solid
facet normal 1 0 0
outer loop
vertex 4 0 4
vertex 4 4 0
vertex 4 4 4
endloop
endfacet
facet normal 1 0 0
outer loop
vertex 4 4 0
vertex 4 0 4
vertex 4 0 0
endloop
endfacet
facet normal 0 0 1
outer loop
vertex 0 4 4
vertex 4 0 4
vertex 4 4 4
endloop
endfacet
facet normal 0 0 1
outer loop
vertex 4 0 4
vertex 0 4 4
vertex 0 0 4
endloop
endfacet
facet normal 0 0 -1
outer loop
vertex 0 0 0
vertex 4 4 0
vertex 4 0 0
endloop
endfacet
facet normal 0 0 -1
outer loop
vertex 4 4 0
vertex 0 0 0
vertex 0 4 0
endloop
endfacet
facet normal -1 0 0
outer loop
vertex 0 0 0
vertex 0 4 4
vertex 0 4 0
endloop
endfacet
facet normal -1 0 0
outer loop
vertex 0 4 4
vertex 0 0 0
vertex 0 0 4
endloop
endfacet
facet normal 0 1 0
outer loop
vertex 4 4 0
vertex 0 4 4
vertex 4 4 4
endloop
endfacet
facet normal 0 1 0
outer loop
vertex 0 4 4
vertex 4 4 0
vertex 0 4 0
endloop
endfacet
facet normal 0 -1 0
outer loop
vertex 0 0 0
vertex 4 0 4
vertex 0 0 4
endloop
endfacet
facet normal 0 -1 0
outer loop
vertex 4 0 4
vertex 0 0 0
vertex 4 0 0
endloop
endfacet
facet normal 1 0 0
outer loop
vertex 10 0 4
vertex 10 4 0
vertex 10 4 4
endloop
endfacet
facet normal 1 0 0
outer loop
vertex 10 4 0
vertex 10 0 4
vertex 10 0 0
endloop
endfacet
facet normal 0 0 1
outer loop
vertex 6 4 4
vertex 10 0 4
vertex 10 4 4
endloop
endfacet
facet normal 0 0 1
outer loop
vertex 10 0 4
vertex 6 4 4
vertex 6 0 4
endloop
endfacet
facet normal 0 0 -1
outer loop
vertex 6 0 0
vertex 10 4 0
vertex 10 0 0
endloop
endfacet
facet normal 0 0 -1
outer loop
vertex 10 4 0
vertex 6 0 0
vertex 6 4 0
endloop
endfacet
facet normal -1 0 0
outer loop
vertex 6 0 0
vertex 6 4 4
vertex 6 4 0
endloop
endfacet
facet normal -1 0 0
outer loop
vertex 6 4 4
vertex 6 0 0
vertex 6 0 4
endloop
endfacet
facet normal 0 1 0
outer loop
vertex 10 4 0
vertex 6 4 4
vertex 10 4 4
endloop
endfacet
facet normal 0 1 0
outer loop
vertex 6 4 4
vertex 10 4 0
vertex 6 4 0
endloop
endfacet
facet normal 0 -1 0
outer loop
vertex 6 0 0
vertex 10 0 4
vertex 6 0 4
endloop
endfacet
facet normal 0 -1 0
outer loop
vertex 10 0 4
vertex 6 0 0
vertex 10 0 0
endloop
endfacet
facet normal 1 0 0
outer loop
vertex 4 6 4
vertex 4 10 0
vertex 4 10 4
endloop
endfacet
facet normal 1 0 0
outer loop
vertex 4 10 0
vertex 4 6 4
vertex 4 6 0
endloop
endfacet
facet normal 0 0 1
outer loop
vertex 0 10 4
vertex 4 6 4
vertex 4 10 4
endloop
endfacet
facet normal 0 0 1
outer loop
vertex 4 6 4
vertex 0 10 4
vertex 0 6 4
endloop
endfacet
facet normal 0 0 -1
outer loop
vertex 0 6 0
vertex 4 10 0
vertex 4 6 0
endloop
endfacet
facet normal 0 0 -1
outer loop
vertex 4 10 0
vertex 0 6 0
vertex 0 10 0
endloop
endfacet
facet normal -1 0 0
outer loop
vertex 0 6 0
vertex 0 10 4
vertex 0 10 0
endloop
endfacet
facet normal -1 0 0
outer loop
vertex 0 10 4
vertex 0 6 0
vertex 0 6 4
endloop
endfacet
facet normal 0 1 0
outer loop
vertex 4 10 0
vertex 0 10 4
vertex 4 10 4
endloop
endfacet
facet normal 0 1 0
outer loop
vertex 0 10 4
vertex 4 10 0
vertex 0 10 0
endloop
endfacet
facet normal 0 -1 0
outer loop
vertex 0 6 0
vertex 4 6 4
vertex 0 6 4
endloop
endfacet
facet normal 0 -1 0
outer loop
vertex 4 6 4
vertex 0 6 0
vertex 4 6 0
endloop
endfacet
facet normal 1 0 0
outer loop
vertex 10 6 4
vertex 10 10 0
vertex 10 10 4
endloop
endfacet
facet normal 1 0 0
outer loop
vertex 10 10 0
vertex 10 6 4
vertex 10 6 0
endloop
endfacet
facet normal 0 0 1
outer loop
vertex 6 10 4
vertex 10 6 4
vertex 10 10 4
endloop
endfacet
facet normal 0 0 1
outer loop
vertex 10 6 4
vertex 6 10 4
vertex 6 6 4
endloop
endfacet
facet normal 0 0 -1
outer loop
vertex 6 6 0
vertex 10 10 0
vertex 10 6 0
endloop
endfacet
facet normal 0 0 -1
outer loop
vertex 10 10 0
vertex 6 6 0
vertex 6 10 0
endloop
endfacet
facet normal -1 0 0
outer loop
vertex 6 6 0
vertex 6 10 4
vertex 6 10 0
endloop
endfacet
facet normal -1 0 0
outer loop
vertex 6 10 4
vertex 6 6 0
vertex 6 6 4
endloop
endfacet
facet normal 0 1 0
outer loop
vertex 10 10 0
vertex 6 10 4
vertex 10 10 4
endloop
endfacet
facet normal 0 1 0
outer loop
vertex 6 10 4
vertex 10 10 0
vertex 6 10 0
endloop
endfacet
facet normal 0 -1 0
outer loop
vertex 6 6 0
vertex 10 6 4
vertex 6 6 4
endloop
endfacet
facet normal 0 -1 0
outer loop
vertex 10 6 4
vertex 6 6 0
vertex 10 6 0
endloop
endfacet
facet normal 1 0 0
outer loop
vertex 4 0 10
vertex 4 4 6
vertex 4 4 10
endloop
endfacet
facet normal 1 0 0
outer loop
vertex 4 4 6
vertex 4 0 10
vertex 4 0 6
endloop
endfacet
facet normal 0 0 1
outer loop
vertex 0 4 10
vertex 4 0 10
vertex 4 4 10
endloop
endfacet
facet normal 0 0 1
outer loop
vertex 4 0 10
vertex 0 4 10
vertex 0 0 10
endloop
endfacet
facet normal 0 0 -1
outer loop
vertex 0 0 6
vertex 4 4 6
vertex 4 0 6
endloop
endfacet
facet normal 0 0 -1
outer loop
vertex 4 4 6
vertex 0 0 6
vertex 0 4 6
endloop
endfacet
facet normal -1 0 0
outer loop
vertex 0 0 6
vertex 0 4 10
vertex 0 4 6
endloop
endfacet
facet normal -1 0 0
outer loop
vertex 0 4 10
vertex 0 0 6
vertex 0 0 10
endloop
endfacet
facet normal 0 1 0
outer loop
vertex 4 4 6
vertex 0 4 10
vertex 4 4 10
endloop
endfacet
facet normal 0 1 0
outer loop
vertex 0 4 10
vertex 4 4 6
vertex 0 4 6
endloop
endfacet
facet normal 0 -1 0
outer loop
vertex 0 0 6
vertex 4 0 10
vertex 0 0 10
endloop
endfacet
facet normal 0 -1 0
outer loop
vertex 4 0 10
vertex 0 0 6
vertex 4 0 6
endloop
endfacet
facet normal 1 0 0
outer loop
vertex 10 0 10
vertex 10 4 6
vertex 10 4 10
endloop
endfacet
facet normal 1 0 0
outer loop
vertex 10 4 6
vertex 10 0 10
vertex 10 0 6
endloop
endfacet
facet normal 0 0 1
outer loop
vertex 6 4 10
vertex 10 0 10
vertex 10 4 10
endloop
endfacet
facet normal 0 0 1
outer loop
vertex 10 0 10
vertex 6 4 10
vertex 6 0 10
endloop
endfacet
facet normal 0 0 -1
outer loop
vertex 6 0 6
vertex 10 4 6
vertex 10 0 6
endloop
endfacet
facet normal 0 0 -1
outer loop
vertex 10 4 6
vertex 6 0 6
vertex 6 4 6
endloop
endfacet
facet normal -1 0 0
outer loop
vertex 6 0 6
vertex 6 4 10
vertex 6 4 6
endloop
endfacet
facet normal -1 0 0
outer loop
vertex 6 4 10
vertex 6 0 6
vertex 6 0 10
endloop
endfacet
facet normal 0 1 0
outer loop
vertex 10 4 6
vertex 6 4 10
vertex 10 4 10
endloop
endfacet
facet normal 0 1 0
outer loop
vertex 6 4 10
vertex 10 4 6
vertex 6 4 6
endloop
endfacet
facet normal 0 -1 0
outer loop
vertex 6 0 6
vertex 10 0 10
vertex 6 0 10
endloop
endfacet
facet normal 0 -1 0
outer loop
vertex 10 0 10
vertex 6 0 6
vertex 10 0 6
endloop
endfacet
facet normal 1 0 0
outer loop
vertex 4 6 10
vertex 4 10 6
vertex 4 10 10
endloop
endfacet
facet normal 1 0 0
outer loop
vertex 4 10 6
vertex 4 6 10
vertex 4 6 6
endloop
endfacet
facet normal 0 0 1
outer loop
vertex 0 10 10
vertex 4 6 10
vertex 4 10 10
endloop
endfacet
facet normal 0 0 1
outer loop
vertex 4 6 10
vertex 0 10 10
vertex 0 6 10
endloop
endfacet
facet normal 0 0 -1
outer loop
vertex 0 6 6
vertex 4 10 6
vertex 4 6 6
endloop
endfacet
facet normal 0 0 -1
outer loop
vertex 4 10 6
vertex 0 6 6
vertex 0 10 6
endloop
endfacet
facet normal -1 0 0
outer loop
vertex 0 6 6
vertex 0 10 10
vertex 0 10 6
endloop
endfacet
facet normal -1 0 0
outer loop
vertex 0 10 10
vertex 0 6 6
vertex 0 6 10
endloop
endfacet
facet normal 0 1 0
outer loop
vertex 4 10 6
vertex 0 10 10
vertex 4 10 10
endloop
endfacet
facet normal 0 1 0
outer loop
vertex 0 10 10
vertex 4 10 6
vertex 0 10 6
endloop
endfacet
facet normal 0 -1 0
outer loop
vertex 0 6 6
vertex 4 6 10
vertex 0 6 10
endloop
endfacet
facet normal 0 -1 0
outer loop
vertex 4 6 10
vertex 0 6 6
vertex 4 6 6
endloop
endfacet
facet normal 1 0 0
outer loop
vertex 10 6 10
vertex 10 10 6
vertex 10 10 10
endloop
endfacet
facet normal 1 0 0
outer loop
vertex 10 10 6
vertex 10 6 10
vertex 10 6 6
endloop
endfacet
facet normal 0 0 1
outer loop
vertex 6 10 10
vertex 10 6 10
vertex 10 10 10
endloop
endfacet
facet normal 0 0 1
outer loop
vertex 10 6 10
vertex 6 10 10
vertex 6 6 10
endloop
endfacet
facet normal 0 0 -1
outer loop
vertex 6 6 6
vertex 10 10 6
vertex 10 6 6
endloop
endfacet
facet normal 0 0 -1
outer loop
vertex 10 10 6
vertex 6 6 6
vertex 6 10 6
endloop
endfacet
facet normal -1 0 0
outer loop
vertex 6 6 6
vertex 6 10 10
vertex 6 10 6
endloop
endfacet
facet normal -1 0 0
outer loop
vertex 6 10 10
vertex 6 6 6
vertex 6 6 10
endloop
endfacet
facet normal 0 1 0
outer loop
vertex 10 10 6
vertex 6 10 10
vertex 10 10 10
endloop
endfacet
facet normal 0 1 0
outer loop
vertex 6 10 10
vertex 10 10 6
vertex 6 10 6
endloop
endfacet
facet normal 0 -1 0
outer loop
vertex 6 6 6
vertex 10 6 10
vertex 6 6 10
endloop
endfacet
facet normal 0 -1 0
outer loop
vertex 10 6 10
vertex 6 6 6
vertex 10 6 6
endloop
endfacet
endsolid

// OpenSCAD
module lvl3() { cube([4, 4, 4]); }
module lvl2() { union() { lvl3(); translate([6, 0, 0]) lvl3(); } }
module lvl1() { union() { lvl2(); translate([0, 6, 0]) lvl2(); } }
union() { lvl1(); translate([0, 0, 6]) lvl1(); }
